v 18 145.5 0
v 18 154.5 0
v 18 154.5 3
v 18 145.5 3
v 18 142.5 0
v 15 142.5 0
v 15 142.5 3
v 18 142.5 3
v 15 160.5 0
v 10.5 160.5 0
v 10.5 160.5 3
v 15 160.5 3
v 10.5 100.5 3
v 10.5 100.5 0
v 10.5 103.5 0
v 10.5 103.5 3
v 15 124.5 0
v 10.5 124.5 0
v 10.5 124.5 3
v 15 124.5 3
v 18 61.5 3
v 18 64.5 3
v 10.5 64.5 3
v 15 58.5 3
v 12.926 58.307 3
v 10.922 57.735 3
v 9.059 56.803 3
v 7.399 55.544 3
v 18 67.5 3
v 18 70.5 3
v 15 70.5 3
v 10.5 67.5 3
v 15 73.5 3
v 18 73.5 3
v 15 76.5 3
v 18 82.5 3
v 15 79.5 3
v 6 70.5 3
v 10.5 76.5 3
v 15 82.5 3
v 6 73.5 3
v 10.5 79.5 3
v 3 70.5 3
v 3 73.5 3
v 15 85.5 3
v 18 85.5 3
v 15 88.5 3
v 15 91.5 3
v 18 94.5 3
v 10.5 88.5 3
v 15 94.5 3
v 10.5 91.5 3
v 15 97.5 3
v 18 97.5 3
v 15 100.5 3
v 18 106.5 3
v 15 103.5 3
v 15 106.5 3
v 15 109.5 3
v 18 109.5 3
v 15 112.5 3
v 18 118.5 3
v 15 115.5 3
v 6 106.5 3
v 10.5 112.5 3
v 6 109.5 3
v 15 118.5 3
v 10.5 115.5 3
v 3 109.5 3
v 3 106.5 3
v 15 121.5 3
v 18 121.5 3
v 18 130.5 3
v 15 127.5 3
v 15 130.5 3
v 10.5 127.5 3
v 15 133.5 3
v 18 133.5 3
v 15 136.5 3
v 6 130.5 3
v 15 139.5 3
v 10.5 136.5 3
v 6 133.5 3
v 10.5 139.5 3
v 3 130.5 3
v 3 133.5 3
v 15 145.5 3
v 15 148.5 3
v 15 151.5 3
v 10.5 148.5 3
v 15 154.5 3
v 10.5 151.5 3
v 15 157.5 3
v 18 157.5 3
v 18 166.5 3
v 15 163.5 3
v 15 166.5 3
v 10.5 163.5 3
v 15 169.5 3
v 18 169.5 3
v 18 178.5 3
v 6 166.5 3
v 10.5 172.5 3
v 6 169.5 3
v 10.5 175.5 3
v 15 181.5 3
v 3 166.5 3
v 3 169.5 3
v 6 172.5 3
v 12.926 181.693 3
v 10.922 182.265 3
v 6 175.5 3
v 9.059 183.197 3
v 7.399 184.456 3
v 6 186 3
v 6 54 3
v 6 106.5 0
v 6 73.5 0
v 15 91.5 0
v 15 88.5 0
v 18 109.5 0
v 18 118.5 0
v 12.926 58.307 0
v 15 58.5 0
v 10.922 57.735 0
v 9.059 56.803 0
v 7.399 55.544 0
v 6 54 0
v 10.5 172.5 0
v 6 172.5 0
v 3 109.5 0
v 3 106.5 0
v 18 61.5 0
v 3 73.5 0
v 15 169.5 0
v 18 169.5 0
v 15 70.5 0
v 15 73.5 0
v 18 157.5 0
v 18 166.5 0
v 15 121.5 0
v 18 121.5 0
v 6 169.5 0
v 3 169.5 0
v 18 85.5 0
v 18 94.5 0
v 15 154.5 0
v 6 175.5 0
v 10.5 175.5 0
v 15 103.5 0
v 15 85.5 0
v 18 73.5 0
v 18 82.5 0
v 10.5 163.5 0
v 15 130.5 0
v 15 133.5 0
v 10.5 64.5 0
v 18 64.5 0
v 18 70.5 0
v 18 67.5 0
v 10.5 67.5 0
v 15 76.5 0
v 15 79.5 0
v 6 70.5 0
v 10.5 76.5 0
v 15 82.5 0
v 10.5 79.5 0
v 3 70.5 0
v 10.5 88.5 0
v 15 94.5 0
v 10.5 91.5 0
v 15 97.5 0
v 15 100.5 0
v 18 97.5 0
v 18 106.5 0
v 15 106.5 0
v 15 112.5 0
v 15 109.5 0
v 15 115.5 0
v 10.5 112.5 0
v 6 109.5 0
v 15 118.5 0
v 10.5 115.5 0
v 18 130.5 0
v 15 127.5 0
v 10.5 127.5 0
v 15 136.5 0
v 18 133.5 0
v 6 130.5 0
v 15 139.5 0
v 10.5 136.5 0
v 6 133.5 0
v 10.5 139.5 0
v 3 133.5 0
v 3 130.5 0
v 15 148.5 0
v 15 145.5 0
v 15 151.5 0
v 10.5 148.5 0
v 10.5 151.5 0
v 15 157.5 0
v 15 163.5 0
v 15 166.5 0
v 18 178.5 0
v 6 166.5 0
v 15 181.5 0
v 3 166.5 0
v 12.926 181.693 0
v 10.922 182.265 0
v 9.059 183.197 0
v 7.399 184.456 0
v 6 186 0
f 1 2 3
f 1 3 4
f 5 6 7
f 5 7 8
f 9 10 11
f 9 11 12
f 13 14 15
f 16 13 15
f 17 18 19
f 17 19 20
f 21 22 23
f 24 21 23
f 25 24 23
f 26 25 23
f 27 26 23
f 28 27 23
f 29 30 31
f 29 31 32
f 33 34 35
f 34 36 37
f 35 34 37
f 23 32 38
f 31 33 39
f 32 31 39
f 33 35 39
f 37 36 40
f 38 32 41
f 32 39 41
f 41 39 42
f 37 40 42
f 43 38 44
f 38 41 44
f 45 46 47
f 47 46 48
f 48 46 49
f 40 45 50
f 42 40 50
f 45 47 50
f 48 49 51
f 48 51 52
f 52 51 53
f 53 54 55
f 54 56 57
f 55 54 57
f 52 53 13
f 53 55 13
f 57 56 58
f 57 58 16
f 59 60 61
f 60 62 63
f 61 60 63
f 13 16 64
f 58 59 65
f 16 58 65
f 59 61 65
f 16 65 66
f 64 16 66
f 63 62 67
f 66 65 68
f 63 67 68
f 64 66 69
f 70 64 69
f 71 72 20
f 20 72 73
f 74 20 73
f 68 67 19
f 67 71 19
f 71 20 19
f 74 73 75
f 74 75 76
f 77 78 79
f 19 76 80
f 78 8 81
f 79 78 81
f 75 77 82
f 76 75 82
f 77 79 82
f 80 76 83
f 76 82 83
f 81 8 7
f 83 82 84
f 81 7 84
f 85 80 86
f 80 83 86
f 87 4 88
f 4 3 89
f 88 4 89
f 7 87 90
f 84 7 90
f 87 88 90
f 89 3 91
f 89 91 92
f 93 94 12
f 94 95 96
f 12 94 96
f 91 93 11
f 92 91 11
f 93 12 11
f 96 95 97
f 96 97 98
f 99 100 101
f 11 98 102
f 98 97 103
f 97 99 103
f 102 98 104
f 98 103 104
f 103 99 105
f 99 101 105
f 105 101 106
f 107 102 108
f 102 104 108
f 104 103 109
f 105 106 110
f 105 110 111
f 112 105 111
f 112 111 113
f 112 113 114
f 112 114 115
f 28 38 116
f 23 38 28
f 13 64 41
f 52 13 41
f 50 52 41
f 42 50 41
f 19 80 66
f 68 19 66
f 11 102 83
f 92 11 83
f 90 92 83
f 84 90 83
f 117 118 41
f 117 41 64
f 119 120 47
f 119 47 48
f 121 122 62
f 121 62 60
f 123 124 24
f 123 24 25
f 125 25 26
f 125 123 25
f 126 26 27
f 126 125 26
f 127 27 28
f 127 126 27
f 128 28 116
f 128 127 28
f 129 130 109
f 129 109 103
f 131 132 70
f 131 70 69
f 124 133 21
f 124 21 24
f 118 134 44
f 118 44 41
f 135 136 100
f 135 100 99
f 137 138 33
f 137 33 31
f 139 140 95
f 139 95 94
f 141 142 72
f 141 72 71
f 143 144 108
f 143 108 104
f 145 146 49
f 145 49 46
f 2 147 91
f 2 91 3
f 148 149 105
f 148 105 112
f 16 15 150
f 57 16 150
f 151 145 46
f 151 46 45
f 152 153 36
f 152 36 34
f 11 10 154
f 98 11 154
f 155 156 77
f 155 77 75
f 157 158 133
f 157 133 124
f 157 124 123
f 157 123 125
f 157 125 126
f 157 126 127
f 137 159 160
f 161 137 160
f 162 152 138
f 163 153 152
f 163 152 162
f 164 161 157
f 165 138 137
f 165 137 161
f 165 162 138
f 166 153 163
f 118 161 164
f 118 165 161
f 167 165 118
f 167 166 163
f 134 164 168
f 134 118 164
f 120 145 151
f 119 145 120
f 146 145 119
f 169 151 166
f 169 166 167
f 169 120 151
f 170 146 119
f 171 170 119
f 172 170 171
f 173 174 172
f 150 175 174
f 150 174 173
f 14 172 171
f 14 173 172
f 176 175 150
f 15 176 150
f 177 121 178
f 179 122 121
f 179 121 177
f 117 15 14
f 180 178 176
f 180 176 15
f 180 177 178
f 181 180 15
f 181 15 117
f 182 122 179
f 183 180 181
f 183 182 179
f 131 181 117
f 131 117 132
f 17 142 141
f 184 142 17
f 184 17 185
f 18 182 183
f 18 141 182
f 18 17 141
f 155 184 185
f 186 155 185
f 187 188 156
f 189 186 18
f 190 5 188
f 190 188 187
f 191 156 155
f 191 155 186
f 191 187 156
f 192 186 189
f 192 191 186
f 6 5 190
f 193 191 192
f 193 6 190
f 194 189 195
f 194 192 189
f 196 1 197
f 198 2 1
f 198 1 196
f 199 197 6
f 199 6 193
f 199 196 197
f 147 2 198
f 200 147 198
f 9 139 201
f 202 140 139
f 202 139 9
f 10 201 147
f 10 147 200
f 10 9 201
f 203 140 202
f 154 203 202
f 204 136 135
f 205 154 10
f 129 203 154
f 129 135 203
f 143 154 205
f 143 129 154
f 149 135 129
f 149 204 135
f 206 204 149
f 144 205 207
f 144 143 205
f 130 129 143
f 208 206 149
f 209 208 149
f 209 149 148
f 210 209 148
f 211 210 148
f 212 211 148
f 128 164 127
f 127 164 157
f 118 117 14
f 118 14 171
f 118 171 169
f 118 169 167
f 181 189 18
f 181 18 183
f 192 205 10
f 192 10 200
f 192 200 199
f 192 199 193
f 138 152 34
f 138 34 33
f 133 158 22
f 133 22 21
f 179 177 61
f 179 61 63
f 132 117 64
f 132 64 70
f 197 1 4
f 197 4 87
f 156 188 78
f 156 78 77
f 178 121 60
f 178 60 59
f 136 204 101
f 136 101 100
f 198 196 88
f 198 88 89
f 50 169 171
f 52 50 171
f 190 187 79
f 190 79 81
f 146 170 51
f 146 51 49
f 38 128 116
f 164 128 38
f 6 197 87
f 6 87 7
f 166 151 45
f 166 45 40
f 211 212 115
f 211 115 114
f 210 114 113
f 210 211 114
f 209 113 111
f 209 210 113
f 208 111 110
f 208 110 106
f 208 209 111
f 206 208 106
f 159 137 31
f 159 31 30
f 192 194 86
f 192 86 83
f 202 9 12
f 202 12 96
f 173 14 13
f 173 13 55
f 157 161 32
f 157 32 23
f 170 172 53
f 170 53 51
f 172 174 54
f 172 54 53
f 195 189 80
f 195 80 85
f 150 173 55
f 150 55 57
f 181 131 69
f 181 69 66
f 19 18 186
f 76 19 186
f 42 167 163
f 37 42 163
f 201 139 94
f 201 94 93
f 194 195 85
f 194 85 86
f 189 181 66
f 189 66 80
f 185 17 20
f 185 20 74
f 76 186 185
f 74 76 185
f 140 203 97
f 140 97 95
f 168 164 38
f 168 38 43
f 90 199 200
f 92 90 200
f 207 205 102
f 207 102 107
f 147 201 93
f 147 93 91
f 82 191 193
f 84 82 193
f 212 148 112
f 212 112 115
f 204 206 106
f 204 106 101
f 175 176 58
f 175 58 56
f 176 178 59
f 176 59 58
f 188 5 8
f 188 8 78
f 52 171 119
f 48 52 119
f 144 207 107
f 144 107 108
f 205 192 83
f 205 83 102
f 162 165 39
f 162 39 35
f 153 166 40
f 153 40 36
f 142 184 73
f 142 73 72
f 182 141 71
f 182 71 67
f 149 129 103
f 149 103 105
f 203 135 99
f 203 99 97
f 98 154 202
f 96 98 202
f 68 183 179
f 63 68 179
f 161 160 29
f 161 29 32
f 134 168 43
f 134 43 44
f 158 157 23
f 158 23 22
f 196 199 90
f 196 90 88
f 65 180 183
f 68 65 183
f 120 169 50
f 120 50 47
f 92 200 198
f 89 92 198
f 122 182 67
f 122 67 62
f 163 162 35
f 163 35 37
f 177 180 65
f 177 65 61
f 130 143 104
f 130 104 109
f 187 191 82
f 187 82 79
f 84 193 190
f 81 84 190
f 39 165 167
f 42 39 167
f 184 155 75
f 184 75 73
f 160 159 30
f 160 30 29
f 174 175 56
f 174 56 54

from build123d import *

# Parameters (mm, degrees)
SKETCH1_W           = 4.5
SKETCH1_H           = 3
BOSS_EXTRUDE1_DEPTH = 3


with BuildPart() as part:
    # Sketch1 → Boss-Extrude1 (new body)
    with BuildSketch(Plane.XY):
        with BuildLine():
            Line((18, 157.5), (15, 157.5))
            Line((15, 157.5), (15, 154.5))
            Line((15, 154.5), (18, 154.5))
            Line((18, 154.5), (18, 145.5))
            Line((18, 145.5), (15, 145.5))
            Line((15, 145.5), (15, 142.5))
            Line((15, 142.5), (18, 142.5))
            Line((18, 142.5), (18, 133.5))
            Line((18, 133.5), (15, 133.5))
            Line((15, 133.5), (15, 130.5))
            Line((15, 130.5), (18, 130.5))
            Line((18, 130.5), (18, 121.5))
            Line((18, 121.5), (15, 121.5))
            Line((15, 121.5), (15, 118.5))
            Line((15, 118.5), (18, 118.5))
            Line((18, 118.5), (18, 109.5))
            Line((18, 109.5), (15, 109.5))
            Line((15, 109.5), (15, 106.5))
            Line((15, 106.5), (18, 106.5))
            Line((18, 106.5), (18, 97.5))
            Line((18, 97.5), (15, 97.5))
            Line((15, 97.5), (15, 94.5))
            Line((15, 94.5), (18, 94.5))
            Line((18, 94.5), (18, 85.5))
            Line((18, 85.5), (15, 85.5))
            Line((15, 85.5), (15, 82.5))
            Line((15, 82.5), (18, 82.5))
            Line((18, 82.5), (18, 73.5))
            Line((18, 73.5), (15, 73.5))
            Line((15, 73.5), (15, 70.5))
            Line((15, 70.5), (18, 70.5))
            Line((18, 70.5), (18, 67.5))
            Line((18, 67.5), (10.5, 67.5))
            Line((10.5, 67.5), (10.5, 64.5))
            Line((10.5, 64.5), (18, 64.5))
            Line((18, 64.5), (18, 61.5))
            Line((18, 61.5), (15, 58.5))
            ThreePointArc((15, 58.5), (9.968847051, 57.312305899), (6, 54))
            Line((6, 54), (6, 70.5))
            Line((6, 70.5), (3, 70.5))
            Line((3, 70.5), (3, 73.5))
            Line((3, 73.5), (6, 73.5))
            Line((6, 73.5), (6, 106.5))
            Line((6, 106.5), (3, 106.5))
            Line((3, 106.5), (3, 109.5))
            Line((3, 109.5), (6, 109.5))
            Line((6, 109.5), (6, 130.5))
            Line((6, 130.5), (3, 130.5))
            Line((3, 130.5), (3, 133.5))
            Line((3, 133.5), (6, 133.5))
            Line((6, 133.5), (6, 166.5))
            Line((6, 166.5), (3, 166.5))
            Line((3, 166.5), (3, 169.5))
            Line((3, 169.5), (6, 169.5))
            Line((6, 169.5), (6, 172.5))
            Line((6, 172.5), (10.5, 172.5))
            Line((10.5, 172.5), (10.5, 175.5))
            Line((10.5, 175.5), (6, 175.5))
            Line((6, 175.5), (6, 186))
            ThreePointArc((6, 186), (9.968847051, 182.687694101), (15, 181.5))
            Line((15, 181.5), (18, 178.5))
            Line((18, 178.5), (18, 169.5))
            Line((18, 169.5), (15, 169.5))
            Line((15, 169.5), (15, 166.5))
            Line((15, 166.5), (18, 166.5))
            Line((18, 166.5), (18, 157.5))
        make_face()
        with Locations((12.75, 78)):
            Rectangle(SKETCH1_W, SKETCH1_H, mode=Mode.SUBTRACT)
        with Locations((12.75, 162)):
            Rectangle(SKETCH1_W, SKETCH1_H, mode=Mode.SUBTRACT)
        with Locations((12.75, 150)):
            Rectangle(SKETCH1_W, SKETCH1_H, mode=Mode.SUBTRACT)
        with Locations((12.75, 138)):
            Rectangle(SKETCH1_W, SKETCH1_H, mode=Mode.SUBTRACT)
        with Locations((12.75, 126)):
            Rectangle(SKETCH1_W, SKETCH1_H, mode=Mode.SUBTRACT)
        with Locations((12.75, 114)):
            Rectangle(SKETCH1_W, SKETCH1_H, mode=Mode.SUBTRACT)
        with Locations((12.75, 102)):
            Rectangle(SKETCH1_W, SKETCH1_H, mode=Mode.SUBTRACT)
        with Locations((12.75, 90)):
            Rectangle(SKETCH1_W, SKETCH1_H, mode=Mode.SUBTRACT)
    extrude(amount=BOSS_EXTRUDE1_DEPTH)


solid = part.part
